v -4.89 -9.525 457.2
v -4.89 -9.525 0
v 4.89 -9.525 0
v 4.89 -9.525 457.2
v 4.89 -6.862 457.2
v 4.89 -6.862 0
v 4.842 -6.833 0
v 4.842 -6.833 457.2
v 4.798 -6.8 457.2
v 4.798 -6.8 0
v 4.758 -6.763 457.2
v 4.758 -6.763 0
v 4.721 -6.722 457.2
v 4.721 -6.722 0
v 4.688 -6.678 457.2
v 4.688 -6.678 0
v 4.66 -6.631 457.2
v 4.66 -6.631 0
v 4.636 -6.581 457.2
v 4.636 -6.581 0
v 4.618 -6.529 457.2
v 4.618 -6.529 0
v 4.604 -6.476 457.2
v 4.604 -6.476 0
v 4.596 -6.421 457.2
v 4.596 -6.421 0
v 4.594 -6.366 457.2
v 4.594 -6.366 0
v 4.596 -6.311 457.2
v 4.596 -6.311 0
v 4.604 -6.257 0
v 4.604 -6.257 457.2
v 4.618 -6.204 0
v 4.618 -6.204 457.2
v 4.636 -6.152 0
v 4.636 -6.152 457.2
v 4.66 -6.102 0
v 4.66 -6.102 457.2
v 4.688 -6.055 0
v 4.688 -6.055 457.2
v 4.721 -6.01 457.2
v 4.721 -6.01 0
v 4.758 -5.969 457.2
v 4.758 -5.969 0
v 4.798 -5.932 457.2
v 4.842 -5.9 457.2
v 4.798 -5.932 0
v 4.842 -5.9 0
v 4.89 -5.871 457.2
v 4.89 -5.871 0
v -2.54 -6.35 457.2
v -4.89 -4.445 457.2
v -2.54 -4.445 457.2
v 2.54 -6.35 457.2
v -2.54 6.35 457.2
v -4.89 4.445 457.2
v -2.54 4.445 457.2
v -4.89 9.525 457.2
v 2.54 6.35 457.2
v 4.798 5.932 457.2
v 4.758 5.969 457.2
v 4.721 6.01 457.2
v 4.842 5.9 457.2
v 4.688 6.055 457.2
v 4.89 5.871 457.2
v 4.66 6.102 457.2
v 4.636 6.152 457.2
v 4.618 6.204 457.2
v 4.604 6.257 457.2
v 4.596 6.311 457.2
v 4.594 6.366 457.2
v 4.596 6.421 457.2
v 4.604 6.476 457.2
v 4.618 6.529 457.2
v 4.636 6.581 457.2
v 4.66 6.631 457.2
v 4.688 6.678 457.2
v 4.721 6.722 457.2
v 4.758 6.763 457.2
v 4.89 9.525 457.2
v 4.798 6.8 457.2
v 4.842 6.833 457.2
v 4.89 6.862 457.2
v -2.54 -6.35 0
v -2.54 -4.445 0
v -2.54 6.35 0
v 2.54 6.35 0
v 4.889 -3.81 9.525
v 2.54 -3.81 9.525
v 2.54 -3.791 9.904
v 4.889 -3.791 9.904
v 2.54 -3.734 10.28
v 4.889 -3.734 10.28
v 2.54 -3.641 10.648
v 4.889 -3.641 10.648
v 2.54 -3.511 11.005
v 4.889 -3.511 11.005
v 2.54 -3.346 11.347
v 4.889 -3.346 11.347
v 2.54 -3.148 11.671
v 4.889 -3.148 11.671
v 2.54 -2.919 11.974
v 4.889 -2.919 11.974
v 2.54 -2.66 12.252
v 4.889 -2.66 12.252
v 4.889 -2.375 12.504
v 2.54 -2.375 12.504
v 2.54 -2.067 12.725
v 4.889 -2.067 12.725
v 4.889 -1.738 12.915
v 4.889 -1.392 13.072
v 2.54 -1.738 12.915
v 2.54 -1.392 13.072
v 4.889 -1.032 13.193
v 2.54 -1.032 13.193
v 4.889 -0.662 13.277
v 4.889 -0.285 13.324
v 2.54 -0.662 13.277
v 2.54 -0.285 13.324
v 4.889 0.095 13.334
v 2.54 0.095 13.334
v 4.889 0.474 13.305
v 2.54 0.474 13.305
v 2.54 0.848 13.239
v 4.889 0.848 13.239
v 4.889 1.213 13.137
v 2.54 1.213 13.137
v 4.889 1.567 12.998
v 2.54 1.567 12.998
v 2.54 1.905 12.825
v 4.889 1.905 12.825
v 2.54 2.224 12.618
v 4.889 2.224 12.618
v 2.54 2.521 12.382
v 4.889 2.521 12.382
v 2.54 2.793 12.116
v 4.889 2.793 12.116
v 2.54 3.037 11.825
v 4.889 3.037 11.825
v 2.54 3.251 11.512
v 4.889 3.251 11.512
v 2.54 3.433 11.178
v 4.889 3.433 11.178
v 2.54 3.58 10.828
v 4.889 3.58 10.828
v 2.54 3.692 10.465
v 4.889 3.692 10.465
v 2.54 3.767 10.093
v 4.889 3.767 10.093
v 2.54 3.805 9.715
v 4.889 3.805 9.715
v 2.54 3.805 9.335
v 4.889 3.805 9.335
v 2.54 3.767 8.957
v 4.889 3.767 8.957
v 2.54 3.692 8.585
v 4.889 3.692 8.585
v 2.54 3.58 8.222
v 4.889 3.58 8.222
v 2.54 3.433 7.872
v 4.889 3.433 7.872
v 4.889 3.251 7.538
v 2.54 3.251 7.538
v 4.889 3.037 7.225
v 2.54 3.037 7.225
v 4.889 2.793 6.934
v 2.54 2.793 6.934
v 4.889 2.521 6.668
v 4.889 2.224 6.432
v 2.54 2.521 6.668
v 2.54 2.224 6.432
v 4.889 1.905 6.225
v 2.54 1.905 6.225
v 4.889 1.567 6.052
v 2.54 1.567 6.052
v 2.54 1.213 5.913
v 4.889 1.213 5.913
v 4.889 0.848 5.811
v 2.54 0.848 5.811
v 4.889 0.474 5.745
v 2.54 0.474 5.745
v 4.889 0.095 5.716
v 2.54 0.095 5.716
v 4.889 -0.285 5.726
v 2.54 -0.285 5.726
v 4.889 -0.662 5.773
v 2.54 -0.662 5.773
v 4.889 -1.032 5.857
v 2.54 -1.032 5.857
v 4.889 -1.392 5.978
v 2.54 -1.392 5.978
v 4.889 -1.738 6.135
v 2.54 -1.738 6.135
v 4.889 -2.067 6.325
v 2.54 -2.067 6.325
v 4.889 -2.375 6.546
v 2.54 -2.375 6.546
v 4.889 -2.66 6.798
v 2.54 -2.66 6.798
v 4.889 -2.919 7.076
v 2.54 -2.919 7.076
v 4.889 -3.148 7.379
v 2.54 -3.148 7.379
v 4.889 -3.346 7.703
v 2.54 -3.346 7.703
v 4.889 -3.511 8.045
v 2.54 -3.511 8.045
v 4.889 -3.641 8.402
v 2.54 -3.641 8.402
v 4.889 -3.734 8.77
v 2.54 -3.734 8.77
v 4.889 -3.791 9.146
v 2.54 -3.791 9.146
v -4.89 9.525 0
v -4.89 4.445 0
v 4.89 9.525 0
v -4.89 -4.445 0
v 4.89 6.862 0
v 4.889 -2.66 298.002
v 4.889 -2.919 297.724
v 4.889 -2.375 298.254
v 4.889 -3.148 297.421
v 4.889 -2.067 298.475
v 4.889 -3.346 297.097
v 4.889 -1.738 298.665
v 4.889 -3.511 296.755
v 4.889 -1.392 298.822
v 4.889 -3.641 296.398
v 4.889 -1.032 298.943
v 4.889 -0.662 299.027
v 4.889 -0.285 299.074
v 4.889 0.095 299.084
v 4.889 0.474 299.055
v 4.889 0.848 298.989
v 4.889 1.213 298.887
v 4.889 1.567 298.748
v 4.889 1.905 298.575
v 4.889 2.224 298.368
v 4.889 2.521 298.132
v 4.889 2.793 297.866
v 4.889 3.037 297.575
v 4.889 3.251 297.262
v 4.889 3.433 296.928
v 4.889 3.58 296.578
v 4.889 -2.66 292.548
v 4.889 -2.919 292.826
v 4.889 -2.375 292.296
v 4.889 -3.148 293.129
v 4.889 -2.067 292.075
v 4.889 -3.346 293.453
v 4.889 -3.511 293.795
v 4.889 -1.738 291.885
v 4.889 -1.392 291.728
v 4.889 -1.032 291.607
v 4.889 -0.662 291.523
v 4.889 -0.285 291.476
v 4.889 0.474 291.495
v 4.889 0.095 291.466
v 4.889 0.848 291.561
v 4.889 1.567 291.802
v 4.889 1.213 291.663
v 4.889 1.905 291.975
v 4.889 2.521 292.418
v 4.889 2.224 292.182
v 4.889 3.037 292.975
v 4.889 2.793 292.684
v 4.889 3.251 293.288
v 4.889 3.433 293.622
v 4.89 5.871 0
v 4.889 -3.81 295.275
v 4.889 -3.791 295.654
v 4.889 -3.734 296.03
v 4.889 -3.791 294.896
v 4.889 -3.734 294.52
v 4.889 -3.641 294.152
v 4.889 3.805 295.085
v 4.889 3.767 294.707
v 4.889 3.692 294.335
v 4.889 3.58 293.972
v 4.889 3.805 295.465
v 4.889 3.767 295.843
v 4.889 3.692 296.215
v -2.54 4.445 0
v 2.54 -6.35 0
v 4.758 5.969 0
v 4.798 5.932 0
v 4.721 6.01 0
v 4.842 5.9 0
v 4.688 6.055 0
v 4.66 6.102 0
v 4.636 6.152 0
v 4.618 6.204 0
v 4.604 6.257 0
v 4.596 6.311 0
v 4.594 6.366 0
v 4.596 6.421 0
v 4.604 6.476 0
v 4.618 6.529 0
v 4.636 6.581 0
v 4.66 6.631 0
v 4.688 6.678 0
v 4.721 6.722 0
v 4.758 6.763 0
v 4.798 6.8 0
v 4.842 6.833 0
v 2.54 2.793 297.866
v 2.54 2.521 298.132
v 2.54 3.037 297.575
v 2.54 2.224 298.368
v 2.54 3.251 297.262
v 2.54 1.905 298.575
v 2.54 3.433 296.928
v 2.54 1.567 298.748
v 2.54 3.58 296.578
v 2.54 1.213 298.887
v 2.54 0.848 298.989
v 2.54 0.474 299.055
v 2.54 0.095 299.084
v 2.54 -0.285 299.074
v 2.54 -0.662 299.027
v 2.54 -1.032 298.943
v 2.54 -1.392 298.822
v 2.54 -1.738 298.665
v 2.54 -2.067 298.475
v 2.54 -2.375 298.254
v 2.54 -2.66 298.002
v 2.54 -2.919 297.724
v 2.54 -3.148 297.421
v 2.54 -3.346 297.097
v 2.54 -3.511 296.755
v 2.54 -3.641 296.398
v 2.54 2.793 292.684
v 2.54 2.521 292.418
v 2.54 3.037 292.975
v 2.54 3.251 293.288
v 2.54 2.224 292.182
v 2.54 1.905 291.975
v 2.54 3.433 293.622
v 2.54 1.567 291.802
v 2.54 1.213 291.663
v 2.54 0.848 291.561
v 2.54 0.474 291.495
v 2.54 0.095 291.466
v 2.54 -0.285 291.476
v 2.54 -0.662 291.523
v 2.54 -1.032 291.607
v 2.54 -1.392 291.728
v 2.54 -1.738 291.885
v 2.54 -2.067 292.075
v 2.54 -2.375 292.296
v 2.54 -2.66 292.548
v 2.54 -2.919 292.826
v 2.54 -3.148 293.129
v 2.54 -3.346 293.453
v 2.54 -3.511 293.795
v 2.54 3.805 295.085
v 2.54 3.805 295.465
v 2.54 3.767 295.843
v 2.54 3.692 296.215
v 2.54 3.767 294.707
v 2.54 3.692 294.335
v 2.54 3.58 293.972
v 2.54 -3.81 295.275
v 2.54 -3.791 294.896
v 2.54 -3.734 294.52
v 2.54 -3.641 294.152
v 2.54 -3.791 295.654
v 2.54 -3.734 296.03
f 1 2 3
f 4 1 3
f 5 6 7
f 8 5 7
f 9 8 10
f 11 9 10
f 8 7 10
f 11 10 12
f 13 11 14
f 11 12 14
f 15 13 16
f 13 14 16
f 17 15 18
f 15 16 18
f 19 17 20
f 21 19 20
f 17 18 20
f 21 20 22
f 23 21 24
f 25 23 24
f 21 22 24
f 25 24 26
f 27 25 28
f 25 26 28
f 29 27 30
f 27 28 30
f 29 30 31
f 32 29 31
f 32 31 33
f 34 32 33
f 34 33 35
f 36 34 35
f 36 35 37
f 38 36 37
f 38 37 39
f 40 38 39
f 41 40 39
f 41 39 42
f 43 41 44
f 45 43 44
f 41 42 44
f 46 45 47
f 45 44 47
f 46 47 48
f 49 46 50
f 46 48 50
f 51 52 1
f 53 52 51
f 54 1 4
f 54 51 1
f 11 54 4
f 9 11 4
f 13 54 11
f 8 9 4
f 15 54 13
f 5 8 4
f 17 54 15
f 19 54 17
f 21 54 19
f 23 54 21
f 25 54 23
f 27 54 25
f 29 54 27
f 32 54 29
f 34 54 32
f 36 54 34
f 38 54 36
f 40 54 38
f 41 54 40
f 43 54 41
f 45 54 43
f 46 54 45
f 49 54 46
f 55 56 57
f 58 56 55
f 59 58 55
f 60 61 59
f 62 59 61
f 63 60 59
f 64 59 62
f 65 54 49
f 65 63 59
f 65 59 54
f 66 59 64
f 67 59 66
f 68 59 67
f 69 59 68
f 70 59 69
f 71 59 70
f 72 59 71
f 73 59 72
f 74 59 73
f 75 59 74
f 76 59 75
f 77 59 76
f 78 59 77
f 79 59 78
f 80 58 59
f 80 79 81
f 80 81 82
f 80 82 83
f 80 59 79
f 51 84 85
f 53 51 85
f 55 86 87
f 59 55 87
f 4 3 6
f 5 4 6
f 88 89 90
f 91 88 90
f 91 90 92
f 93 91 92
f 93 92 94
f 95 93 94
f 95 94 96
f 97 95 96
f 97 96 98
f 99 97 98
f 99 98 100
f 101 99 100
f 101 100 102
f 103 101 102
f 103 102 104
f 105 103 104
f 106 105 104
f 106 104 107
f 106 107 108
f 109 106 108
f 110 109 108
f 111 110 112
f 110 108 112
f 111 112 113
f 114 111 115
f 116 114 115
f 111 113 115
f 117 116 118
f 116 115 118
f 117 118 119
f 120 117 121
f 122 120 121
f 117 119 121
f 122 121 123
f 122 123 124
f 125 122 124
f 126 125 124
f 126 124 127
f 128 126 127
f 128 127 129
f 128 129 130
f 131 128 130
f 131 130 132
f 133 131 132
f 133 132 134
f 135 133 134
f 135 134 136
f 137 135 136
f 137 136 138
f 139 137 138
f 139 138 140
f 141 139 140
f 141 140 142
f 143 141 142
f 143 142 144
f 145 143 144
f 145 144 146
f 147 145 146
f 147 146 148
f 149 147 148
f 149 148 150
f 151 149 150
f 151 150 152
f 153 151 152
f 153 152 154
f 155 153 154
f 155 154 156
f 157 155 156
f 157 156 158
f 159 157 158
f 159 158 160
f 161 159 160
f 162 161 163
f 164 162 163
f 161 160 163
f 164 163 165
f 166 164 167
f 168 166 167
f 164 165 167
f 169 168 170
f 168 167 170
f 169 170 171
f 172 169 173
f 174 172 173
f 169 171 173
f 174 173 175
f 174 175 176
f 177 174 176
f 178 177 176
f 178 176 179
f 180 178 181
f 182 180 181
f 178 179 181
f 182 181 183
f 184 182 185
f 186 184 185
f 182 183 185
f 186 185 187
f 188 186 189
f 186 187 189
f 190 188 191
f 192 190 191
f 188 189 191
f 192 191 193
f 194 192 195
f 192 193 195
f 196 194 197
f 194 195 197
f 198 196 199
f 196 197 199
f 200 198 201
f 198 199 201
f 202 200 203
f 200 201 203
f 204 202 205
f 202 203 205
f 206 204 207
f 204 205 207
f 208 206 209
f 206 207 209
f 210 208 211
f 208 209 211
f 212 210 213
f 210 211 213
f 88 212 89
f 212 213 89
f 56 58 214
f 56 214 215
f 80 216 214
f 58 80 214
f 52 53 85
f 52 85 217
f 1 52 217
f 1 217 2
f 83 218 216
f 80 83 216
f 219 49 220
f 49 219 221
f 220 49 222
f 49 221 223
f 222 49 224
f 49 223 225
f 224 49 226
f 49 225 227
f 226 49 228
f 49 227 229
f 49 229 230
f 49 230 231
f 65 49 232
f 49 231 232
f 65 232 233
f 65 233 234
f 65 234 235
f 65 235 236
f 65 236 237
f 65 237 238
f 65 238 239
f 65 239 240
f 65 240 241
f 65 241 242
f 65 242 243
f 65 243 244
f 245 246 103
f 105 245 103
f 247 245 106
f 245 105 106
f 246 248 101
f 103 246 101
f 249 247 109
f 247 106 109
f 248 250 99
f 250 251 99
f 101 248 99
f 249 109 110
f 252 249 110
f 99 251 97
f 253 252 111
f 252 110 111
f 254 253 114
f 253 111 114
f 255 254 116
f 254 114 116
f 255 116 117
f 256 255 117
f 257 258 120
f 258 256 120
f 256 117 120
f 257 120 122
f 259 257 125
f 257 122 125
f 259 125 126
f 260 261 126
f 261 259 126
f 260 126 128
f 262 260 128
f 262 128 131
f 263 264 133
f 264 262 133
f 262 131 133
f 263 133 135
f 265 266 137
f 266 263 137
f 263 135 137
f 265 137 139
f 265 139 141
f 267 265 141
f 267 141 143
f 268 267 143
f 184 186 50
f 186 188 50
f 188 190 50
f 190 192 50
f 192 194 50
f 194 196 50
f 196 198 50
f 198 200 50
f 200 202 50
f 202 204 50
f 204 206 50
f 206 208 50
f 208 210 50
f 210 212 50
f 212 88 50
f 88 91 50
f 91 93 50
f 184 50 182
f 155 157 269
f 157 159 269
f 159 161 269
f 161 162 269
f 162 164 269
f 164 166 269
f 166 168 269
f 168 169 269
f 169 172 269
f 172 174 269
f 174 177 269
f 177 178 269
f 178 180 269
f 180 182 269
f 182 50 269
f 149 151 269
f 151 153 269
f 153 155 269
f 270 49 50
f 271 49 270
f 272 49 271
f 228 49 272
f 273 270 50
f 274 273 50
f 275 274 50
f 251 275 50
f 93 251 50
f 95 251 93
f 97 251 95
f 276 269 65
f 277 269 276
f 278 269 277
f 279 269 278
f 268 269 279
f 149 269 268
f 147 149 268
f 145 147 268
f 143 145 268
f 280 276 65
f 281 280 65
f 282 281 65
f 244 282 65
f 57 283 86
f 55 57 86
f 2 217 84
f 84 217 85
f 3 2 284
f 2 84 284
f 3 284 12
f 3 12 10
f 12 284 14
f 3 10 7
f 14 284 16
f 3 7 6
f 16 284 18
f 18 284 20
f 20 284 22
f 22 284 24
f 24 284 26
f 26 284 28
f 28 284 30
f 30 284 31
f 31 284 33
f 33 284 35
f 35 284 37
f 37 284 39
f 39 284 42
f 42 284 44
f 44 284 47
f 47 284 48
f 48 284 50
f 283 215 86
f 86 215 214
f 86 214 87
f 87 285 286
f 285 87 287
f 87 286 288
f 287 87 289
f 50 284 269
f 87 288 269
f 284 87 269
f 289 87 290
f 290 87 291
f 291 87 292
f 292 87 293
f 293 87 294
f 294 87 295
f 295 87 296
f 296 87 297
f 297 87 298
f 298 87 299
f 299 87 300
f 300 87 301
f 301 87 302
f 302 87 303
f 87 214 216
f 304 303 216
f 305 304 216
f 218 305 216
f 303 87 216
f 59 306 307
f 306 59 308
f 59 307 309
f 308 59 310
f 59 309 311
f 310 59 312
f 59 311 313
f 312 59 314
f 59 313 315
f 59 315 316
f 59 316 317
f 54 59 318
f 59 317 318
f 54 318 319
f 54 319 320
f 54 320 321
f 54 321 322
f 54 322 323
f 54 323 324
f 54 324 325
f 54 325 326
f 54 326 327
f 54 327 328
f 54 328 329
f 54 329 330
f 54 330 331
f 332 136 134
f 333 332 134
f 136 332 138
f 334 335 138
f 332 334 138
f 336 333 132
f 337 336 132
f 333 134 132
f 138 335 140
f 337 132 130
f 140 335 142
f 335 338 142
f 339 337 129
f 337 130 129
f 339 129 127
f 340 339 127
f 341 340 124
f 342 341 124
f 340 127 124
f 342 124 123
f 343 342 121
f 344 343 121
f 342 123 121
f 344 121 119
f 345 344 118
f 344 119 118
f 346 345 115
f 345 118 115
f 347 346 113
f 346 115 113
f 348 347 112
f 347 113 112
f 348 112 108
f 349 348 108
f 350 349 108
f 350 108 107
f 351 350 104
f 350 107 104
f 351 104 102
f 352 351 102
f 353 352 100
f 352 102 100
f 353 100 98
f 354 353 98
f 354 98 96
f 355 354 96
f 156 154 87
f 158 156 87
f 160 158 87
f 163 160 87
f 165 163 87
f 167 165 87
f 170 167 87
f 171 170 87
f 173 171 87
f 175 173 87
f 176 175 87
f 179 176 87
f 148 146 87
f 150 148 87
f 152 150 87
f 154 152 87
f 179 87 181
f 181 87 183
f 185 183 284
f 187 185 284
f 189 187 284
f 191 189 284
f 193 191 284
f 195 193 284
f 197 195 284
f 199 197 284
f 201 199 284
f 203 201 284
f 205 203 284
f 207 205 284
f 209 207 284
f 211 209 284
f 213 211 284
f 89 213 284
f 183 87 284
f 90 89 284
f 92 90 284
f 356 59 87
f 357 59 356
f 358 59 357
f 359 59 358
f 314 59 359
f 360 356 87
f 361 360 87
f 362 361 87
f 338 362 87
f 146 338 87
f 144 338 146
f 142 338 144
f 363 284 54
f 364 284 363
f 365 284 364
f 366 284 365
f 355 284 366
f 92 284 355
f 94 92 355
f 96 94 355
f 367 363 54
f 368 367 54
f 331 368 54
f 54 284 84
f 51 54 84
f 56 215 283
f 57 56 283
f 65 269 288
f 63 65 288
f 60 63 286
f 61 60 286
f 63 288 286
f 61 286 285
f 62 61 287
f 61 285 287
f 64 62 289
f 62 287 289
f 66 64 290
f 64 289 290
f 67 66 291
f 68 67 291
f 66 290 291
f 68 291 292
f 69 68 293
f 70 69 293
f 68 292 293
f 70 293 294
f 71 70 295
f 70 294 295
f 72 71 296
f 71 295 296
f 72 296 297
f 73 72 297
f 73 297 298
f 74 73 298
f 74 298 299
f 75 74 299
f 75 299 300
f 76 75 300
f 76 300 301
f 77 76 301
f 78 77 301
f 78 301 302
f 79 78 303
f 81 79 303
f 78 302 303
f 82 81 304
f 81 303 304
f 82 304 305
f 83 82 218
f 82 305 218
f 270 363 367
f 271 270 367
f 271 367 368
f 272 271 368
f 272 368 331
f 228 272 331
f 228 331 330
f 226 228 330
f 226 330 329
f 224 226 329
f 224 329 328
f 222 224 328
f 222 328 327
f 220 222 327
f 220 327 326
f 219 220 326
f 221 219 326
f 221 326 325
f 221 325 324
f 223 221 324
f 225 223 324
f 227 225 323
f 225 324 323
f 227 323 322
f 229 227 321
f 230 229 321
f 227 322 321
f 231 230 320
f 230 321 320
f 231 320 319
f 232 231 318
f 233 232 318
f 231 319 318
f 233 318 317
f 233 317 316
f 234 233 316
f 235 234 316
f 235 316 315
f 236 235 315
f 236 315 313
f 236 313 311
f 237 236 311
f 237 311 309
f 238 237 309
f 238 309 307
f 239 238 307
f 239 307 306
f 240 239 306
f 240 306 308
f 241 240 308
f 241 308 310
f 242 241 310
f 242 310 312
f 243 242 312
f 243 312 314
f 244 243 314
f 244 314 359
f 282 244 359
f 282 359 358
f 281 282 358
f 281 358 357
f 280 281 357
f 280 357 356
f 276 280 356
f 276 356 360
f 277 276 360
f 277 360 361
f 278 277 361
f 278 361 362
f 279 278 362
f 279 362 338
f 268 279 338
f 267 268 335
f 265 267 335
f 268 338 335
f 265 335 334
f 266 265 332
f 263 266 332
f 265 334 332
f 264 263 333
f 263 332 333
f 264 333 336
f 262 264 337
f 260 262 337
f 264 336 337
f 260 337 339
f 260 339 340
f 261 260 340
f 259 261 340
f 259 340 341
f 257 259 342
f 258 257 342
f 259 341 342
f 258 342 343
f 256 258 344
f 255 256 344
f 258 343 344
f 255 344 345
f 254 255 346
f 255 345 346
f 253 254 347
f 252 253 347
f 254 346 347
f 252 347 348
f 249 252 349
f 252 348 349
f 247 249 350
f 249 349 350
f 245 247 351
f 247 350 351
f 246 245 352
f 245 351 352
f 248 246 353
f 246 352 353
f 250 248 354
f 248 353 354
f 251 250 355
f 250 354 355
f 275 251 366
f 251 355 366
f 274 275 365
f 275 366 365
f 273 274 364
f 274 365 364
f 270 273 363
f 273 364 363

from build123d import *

# Parameters (mm, degrees)
F1_DEPTH = 457.2
F3_D     = 7.62
F3_DEPTH = 25.4


with BuildPart() as f1:
    # F0 (on Top) → F1 (new body)
    with BuildSketch(Plane.XY):
        with BuildLine():
            Line((-4.8895, -9.525), (4.8895, -9.525))
            Line((4.8895, -9.525), (4.8895, -6.861627))
            ThreePointArc((4.8895, -6.861627), (4.593677, -6.366351), (4.8895, -5.871076))
            Line((4.8895, -5.871076), (4.8895, 5.871076))
            ThreePointArc((4.8895, 5.871076), (4.593677, 6.366351), (4.8895, 6.861627))
            Line((4.8895, 6.861627), (4.8895, 9.525))
            Line((4.8895, 9.525), (-4.8895, 9.525))
            Line((-4.8895, 9.525), (-4.8895, 4.445))
            Line((-4.8895, 4.445), (-2.54, 4.445))
            Line((-2.54, 4.445), (-2.54, 6.35))
            Line((-2.54, 6.35), (2.54, 6.35))
            Line((2.54, 6.35), (2.54, -6.35))
            Line((2.54, -6.35), (-2.54, -6.35))
            Line((-2.54, -6.35), (-2.54, -4.445))
            Line((-2.54, -4.445), (-4.8895, -4.445))
            Line((-4.8895, -4.445), (-4.8895, -9.525))
        make_face()
    extrude(amount=F1_DEPTH)

    # F3
    with Locations(Plane.YZ.offset(4.8895)):
        with Locations((0, 9.525), (0, 295.275)):
            Hole(F3_D / 2, depth=F3_DEPTH)


solid = f1.part
